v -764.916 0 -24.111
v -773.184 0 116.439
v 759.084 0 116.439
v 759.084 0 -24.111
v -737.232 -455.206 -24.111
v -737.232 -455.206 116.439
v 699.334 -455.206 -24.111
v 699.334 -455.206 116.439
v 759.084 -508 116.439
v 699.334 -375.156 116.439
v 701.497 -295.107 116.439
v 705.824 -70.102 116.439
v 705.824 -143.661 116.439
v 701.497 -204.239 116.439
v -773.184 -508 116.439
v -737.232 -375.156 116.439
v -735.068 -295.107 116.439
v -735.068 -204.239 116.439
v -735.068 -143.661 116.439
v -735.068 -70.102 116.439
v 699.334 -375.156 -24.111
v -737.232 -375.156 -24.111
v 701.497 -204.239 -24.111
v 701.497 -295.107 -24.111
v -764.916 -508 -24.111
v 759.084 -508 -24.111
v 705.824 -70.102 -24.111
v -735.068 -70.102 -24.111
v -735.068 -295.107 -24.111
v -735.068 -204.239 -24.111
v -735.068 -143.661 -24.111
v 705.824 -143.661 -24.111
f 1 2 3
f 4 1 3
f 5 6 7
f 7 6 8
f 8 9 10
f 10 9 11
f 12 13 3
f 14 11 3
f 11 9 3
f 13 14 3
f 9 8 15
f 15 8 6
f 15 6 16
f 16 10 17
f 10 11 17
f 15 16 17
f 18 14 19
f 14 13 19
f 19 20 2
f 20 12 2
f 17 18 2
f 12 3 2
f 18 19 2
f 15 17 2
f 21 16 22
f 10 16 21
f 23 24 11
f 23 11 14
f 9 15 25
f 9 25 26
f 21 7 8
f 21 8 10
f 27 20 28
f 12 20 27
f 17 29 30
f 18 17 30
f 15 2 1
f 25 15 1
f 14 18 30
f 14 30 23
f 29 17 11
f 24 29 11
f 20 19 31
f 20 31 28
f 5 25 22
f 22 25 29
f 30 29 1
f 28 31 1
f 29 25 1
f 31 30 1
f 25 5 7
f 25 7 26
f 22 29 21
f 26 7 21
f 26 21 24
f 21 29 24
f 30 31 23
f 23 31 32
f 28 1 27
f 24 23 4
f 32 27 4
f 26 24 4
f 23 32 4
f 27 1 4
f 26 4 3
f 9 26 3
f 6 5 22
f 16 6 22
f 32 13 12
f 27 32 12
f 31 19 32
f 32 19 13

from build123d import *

# Parameters (mm, degrees)
F1_DEPTH = 508
F2_W     = 1436.565518
F2_H     = 80.049575
F2_W_2   = 1436.565519
F2_H_2   = 90.867102
F2_W_3   = 1440.892518
F2_H_3   = 73.559083
F3_DEPTH = 254


with BuildPart() as f1:
    # F0 (on Front) → F1 (new body)
    with BuildSketch(Plane.XZ):
        Polygon((759.084124, 116.439129), (-773.183558, 116.439129), (-764.915876, -24.110599), (759.084124, -24.110599), align=None)
    extrude(amount=F1_DEPTH)

    # F2 (on face) → F3 (cut)
    with BuildSketch(Plane.XY.offset(116.439129)):
        with Locations((-18.949032, -415.180921)):
            Rectangle(F2_W, F2_H)
        with Locations((-16.785503, -249.673009)):
            Rectangle(F2_W_2, F2_H_2)
        with Locations((-14.622003, -106.881854)):
            Rectangle(F2_W_3, F2_H_3)
    extrude(amount=-F3_DEPTH, mode=Mode.SUBTRACT)


solid = f1.part
